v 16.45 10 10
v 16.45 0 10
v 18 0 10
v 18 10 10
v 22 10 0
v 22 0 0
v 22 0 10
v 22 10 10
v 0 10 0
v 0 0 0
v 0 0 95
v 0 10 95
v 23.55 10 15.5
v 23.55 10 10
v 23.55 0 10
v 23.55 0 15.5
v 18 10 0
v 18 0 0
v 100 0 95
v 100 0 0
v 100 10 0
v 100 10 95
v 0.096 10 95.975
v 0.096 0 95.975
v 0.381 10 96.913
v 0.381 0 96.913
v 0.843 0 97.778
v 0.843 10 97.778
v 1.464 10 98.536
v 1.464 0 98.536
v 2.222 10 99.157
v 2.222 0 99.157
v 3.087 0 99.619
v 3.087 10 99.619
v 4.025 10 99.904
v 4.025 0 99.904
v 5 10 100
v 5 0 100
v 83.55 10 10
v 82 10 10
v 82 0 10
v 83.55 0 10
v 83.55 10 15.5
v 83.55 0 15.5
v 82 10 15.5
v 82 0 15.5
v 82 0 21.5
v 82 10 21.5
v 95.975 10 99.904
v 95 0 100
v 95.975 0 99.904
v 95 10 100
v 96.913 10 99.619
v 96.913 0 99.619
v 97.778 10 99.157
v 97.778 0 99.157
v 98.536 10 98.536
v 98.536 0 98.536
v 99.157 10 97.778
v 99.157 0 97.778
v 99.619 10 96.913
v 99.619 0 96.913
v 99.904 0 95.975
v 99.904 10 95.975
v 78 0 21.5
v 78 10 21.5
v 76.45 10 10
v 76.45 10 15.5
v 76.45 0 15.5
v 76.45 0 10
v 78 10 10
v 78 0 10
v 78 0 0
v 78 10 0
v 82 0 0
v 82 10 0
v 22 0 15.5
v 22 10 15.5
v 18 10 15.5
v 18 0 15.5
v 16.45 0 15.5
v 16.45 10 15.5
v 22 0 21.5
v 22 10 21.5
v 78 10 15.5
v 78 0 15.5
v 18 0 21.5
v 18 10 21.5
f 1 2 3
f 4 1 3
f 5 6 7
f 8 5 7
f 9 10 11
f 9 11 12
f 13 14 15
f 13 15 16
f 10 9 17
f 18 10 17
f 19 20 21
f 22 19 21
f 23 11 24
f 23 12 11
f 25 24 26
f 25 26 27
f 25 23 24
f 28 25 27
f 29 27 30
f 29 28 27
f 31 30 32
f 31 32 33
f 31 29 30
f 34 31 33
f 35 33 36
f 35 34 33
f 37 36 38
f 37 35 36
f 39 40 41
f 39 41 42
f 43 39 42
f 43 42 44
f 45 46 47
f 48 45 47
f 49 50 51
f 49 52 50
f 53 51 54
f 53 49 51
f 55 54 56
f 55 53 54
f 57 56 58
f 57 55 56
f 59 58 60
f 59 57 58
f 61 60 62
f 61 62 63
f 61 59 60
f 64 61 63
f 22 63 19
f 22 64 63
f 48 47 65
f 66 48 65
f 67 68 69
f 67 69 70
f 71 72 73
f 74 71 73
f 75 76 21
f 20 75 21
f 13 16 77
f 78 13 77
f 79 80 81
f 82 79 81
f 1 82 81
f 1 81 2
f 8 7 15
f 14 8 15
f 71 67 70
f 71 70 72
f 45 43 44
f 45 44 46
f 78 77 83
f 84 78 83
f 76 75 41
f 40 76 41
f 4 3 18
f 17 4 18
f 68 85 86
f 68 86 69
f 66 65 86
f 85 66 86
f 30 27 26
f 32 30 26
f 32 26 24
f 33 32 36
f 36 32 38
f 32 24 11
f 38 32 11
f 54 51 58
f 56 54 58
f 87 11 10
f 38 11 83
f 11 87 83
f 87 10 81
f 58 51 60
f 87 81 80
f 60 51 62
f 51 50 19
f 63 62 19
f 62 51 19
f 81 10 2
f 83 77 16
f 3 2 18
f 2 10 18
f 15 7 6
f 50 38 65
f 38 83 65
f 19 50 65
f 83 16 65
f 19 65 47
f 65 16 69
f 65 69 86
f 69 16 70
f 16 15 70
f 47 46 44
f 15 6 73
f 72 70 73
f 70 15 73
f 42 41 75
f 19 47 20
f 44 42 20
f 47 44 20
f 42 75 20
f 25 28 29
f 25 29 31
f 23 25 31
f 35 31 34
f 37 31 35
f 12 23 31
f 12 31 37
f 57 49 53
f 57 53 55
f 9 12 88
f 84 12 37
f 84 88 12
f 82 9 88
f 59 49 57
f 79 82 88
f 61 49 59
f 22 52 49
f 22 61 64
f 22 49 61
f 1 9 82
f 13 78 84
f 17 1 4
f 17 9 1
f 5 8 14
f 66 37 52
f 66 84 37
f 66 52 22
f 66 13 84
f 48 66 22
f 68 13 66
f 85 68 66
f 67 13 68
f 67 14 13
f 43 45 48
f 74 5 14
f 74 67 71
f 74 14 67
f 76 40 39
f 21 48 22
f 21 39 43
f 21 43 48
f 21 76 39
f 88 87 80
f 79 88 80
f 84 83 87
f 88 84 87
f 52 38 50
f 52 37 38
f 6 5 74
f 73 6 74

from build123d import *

# Parameters (mm, degrees)
SKETCH1_W               = 100
SKETCH1_H               = 10
BOSS_EXTRUDE1_DEPTH     = 100
ENL_V_MAT_EXTRU_1_DEPTH = 10
CONG_1_R                = 5
CONG_3_R                = 5


with BuildPart() as part:
    # Sketch1 → Boss-Extrude1 (new body)
    with BuildSketch(Plane.XY):
        with Locations((50, 5)):
            Rectangle(SKETCH1_W, SKETCH1_H)
    extrude(amount=BOSS_EXTRUDE1_DEPTH)

    # Esquisse1 → Enlèv. mat.-Extru.1 (cut)
    with BuildSketch(Plane.XZ):
        Polygon((18, 10), (18, 0), (22, 0), (22, 10), (23.55, 10), (23.55, 15.5), (22, 15.5), (22, 21.5), (18, 21.5), (18, 15.5), (16.45, 15.5), (16.45, 10), align=None)
        Polygon((78, 10), (78, 0), (82, 0), (82, 10), (83.55, 10), (83.55, 15.5), (82, 15.5), (82, 21.5), (78, 21.5), (78, 15.5), (76.45, 15.5), (76.45, 10), align=None)
    extrude(amount=-ENL_V_MAT_EXTRU_1_DEPTH, mode=Mode.SUBTRACT)

    # Congé1
    cong_1_edges = [part.edges().sort_by_distance(p)[0] for p in [
        (0, 5, 100),
    ]]
    fillet(cong_1_edges, radius=CONG_1_R)

    # Congé3
    cong_3_edges = [part.edges().sort_by_distance(p)[0] for p in [
        (100, 5, 100),
    ]]
    fillet(cong_3_edges, radius=CONG_3_R)


solid = part.part
